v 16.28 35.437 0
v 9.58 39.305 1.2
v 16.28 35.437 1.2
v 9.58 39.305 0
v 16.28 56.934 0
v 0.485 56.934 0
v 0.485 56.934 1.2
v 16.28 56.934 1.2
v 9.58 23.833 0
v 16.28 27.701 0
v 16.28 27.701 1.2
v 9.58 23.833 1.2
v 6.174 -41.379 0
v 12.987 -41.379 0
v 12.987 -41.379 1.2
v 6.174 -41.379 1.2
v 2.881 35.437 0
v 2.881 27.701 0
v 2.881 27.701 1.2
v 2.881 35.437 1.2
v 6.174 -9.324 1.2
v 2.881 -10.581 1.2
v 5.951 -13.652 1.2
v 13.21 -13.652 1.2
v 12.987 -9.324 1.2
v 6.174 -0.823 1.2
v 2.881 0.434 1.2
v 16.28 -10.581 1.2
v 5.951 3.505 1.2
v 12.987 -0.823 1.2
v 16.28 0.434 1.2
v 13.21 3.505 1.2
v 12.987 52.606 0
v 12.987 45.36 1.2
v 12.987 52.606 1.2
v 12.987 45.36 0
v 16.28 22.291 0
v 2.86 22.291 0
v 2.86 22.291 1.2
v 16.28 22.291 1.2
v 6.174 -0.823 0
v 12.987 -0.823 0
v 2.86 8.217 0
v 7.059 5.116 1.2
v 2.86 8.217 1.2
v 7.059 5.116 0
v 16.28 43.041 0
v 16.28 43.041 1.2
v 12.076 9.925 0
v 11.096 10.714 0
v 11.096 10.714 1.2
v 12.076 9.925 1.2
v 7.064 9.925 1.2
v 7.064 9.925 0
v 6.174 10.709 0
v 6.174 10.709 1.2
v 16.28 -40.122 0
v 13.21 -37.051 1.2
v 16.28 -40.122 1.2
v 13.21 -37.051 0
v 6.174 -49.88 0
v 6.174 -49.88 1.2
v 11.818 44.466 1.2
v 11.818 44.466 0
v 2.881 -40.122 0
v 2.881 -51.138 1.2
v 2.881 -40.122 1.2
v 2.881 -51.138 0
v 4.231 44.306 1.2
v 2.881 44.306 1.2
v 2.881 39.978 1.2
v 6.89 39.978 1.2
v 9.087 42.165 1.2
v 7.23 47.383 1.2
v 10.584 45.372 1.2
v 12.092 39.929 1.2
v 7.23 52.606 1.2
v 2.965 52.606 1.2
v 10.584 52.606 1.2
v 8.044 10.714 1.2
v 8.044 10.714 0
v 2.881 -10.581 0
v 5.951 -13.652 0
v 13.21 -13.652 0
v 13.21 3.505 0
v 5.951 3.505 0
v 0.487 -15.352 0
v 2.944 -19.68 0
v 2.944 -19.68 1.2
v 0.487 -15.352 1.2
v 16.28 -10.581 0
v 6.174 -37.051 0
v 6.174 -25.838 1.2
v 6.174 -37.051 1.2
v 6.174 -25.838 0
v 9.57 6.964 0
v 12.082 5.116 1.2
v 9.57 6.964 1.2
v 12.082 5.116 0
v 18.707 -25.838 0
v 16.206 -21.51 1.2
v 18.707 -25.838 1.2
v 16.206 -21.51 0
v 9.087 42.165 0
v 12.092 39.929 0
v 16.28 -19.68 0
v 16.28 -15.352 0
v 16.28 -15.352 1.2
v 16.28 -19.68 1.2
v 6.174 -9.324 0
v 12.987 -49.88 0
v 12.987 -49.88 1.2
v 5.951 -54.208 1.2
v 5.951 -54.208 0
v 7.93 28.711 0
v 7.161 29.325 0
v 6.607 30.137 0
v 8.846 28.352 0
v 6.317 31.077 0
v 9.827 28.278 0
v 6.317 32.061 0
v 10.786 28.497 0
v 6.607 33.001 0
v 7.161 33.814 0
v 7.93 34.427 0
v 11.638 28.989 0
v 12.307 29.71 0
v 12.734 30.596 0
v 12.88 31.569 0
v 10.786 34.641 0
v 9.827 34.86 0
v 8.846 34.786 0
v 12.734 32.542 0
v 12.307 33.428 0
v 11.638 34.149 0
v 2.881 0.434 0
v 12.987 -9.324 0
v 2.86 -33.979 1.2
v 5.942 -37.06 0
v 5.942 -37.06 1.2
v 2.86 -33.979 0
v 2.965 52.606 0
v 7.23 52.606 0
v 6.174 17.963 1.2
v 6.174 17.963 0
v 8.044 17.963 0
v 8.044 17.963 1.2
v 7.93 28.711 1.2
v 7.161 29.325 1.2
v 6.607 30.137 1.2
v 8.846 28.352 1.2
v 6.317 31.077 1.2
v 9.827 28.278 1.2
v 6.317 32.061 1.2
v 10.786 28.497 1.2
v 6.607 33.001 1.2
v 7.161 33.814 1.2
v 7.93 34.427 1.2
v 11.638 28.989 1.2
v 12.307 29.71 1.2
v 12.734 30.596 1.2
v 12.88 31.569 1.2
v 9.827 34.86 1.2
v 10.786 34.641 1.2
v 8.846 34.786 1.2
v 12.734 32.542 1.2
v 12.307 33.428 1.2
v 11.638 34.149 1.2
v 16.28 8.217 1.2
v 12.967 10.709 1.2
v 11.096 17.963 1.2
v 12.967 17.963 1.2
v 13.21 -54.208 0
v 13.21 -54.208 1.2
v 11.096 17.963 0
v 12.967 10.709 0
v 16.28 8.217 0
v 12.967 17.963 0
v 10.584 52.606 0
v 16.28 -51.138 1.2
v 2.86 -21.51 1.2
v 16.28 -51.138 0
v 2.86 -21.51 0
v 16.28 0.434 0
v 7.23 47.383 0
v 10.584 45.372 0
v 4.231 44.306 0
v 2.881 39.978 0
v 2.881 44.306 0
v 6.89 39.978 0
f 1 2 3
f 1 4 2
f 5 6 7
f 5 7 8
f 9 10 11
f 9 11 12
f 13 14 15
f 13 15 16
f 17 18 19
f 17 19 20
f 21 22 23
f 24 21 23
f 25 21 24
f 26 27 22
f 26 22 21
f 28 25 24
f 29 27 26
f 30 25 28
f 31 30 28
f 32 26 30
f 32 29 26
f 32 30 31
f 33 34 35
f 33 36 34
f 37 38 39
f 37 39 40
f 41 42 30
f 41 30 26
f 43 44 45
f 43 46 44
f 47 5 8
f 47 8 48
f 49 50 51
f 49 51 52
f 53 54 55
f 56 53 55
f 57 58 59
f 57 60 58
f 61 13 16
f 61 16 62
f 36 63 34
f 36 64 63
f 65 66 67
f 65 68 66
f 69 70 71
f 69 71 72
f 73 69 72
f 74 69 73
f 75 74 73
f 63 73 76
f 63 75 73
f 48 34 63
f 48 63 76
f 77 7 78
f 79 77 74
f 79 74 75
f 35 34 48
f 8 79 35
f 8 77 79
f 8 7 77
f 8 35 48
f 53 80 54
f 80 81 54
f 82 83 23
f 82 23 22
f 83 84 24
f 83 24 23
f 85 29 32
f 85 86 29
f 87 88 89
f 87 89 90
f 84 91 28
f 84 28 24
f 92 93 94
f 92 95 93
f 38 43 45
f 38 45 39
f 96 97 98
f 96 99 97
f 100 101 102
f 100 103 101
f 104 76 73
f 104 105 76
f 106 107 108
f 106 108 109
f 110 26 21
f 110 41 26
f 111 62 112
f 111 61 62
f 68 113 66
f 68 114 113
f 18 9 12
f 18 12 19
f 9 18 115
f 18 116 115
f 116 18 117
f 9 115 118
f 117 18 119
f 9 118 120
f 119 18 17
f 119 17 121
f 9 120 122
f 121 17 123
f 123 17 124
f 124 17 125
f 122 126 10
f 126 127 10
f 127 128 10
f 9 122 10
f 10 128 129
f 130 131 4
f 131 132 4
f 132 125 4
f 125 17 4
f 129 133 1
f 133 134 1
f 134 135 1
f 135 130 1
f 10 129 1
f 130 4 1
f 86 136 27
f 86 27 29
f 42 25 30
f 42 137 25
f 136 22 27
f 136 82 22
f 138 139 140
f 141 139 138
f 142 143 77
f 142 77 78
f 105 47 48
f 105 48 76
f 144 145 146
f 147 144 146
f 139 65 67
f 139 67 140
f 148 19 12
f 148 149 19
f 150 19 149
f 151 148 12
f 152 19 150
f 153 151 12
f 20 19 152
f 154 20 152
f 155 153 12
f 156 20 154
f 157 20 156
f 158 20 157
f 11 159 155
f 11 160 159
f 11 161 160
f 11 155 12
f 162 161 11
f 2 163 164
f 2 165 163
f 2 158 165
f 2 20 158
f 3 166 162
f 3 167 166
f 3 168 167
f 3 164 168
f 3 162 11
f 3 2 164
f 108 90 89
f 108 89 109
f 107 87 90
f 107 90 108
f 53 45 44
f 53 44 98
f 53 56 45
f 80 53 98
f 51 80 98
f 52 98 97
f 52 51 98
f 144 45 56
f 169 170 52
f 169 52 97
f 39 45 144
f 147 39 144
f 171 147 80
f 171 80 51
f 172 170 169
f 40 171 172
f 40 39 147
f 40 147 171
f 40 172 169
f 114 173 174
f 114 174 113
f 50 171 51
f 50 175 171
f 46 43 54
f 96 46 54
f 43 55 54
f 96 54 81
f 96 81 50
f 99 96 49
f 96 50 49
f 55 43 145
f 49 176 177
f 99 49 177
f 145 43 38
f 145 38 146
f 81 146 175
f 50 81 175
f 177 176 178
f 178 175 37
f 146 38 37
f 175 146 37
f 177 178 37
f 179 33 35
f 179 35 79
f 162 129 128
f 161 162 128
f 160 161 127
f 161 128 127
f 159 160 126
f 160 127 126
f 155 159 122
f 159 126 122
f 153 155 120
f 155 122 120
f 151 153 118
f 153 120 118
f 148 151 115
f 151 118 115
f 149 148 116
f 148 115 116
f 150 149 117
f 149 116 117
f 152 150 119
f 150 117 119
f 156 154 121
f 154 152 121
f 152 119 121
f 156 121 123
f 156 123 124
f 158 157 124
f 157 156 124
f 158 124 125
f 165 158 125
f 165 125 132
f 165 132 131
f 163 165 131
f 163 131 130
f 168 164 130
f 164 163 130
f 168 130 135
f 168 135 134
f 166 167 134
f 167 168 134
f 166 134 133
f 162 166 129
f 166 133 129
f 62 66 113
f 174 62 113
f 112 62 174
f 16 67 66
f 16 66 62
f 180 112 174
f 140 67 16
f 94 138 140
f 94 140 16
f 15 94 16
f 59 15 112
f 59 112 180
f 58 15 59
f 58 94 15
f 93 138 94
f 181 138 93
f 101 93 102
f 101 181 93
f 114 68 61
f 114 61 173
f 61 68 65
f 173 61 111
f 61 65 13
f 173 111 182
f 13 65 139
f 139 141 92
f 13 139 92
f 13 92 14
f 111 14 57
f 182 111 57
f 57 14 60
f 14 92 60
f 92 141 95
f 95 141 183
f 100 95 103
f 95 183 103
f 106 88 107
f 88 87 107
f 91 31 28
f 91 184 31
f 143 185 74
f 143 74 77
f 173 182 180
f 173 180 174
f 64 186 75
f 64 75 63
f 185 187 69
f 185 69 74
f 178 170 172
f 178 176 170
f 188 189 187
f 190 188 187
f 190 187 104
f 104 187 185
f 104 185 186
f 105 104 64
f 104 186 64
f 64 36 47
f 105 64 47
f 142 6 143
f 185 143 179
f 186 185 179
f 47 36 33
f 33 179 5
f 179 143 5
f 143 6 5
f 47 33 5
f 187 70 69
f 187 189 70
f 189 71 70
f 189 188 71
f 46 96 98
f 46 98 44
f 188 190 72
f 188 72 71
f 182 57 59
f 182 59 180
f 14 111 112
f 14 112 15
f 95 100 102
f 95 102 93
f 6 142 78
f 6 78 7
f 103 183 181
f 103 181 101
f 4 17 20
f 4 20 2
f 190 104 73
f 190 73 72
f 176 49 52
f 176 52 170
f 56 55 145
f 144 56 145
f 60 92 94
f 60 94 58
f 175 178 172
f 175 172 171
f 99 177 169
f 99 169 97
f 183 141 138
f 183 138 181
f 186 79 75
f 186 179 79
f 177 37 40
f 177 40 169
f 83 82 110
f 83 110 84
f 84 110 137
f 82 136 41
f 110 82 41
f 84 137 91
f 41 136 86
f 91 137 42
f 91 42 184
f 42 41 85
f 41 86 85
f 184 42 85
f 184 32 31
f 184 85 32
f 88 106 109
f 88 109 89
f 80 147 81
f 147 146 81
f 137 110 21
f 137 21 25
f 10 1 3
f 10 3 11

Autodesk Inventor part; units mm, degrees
ref_plane "YZ Plane" through (0, 0, 0) normal (1, 0, 0) x (0, 1, 0)
ref_plane "XZ Plane" through (0, 0, 0) normal (0, 1, 0) x (-1, 0, 0)
ref_plane "XY Plane" through (0, 0, 0) normal (0, 0, 1) x (1, 0, 0)
sketch "Sketch1" plane through (0, 0, 0) normal (0, 0, 1) x (1, 0, 0)
  line L0 (13.187, 45.2611) -> (13.187, 52.8058) construction
  line L1 (11.8207, 44.2163) -> (13.187, 45.2611) construction
  line L2 (10.3841, 45.2712) -> (11.8207, 44.2163) construction
  line L3 (10.3841, 52.8058) -> (10.3841, 45.2712) construction
  line L4 (13.187, 52.8058) -> (10.3841, 52.8058) construction
  line L5 (3.0806, 40.1778) -> (3.0806, 44.1058) construction
  line L6 (6.8077, 40.1778) -> (3.0806, 40.1778) construction
  line L7 (9.0681, 42.4281) -> (6.8077, 40.1778) construction
  line L8 (12.0919, 40.1778) -> (9.0681, 42.4281) construction
  line L9 (16.0802, 43.1414) -> (12.0919, 40.1778) construction
  line L10 (16.0802, 56.7338) -> (16.0802, 43.1414) construction
  line L11 (0.8302, 56.7338) -> (16.0802, 56.7338) construction
  line L12 (3.0806, 52.8058) -> (0.8302, 56.7338) construction
  line L13 (7.4305, 52.8058) -> (3.0806, 52.8058) construction
  line L14 (7.4305, 47.3013) -> (7.4305, 52.8058) construction
  line L15 (4.3156, 44.1058) -> (7.4305, 47.3013) construction
  line L16 (3.0806, 44.1058) -> (4.3156, 44.1058) construction
  line L17 (3.0806, 27.8164) -> (3.0806, 35.3218) construction
  line L18 (9.5804, 24.0637) -> (3.0806, 27.8164) construction
  line L19 (16.0802, 27.8164) -> (9.5804, 24.0637) construction
  line L20 (16.0802, 35.3218) -> (16.0802, 27.8164) construction
  line L21 (9.5804, 39.0745) -> (16.0802, 35.3218) construction
  line L22 (3.0806, 35.3218) -> (9.5804, 39.0745) construction
  circle A0 centre (9.5804, 31.5691) radius 3.5 construction
  line L23 (13.1669, 10.6183) -> (13.1669, 18.163) construction
  line L24 (12.0819, 9.664) -> (13.1669, 10.6183) construction
  line L25 (10.8965, 10.6183) -> (12.0819, 9.664) construction
  line L26 (10.8965, 18.163) -> (10.8965, 10.6183) construction
  line L27 (13.1669, 18.163) -> (10.8965, 18.163) construction
  line L28 (8.2443, 10.6183) -> (8.2443, 18.163) construction
  line L29 (7.0588, 9.664) -> (8.2443, 10.6183) construction
  line L30 (5.9739, 10.6183) -> (7.0588, 9.664) construction
  line L31 (5.9739, 18.163) -> (5.9739, 10.6183) construction
  line L32 (8.2443, 18.163) -> (5.9739, 18.163) construction
  line L33 (7.0588, 5.3642) -> (3.0605, 8.3178) construction
  line L34 (9.5704, 7.2127) -> (7.0588, 5.3642) construction
  line L35 (12.0819, 5.3642) -> (9.5704, 7.2127) construction
  line L36 (16.0802, 8.3178) -> (12.0819, 5.3642) construction
  line L37 (16.0802, 22.091) -> (16.0802, 8.3178) construction
  line L38 (3.0605, 22.091) -> (16.0802, 22.091) construction
  line L39 (3.0605, 8.3178) -> (3.0605, 22.091) construction
  line L40 (13.187, -9.5241) -> (13.187, -0.6233) construction
  line L41 (5.9739, -9.5241) -> (13.187, -9.5241) construction
  line L42 (5.9739, -0.6233) -> (5.9739, -9.5241) construction
  line L43 (13.187, -0.6233) -> (5.9739, -0.6233) construction
  line L44 (6.0341, -13.4521) -> (3.0806, -10.4986) construction
  line L45 (13.1267, -13.4521) -> (6.0341, -13.4521) construction
  line L46 (16.0802, -10.4986) -> (13.1267, -13.4521) construction
  line L47 (16.0802, 0.3512) -> (16.0802, -10.4986) construction
  line L48 (13.1267, 3.3048) -> (16.0802, 0.3512) construction
  line L49 (6.0341, 3.3048) -> (13.1267, 3.3048) construction
  line L50 (3.0806, 0.3512) -> (6.0341, 3.3048) construction
  line L51 (3.0806, -10.4986) -> (3.0806, 0.3512) construction
  line L52 (3.0605, -19.4798) -> (0.8302, -15.5518) construction
  line L53 (16.0802, -19.4798) -> (3.0605, -19.4798) construction
  line L54 (16.0802, -15.5518) -> (16.0802, -19.4798) construction
  line L55 (0.8302, -15.5518) -> (16.0802, -15.5518) construction
  line L56 (5.9739, -36.8094) -> (3.0605, -33.896) construction
  line L57 (5.9739, -25.6381) -> (5.9739, -36.8094) construction
  line L58 (18.3607, -25.6381) -> (5.9739, -25.6381) construction
  line L59 (16.0903, -21.7101) -> (18.3607, -25.6381) construction
  line L60 (3.0605, -21.7101) -> (16.0903, -21.7101) construction
  line L61 (3.0605, -33.896) -> (3.0605, -21.7101) construction
  line L62 (13.187, -50.0803) -> (13.187, -41.1794) construction
  line L63 (5.9739, -50.0803) -> (13.187, -50.0803) construction
  line L64 (5.9739, -41.1794) -> (5.9739, -50.0803) construction
  line L65 (13.187, -41.1794) -> (5.9739, -41.1794) construction
  line L66 (6.0341, -54.0083) -> (3.0806, -51.0548) construction
  line L67 (13.1267, -54.0083) -> (6.0341, -54.0083) construction
  line L68 (16.0802, -51.0548) -> (13.1267, -54.0083) construction
  line L69 (16.0802, -40.2049) -> (16.0802, -51.0548) construction
  line L70 (13.1267, -37.2514) -> (16.0802, -40.2049) construction
  line L71 (6.0341, -37.2514) -> (13.1267, -37.2514) construction
  line L72 (3.0806, -40.2049) -> (6.0341, -37.2514) construction
  line L73 (3.0806, -51.0548) -> (3.0806, -40.2049) construction
  line L74 (7.2305, 52.6058) -> (2.9647, 52.6058)
  line L75 (2.9647, 52.6058) -> (0.4852, 56.9338)
  line L76 (0.4852, 56.9338) -> (16.2802, 56.9338)
  line L77 (16.2802, 56.9338) -> (16.2802, 43.0408)
  line L78 (16.2802, 43.0408) -> (12.0919, 39.9286)
  line L79 (12.0919, 39.9286) -> (9.087, 42.1647)
  line L80 (9.087, 42.1647) -> (6.8903, 39.9778)
  line L81 (6.8903, 39.9778) -> (2.8806, 39.9778)
  line L82 (2.8806, 39.9778) -> (2.8806, 44.3058)
  line L83 (2.8806, 44.3058) -> (4.2313, 44.3058)
  line L84 (4.2313, 44.3058) -> (7.2305, 47.3827)
  line L85 (7.2305, 47.3827) -> (7.2305, 52.6058)
  line L86 (11.8183, 44.4662) -> (12.987, 45.36)
  line L87 (12.987, 45.36) -> (12.987, 52.6058)
  line L88 (12.987, 52.6058) -> (10.5841, 52.6058)
  line L89 (10.5841, 52.6058) -> (10.5841, 45.3724)
  line L90 (10.5841, 45.3724) -> (11.8183, 44.4662)
  circle A1 centre (9.5804, 31.5691) radius 3.3
  line L91 (9.5804, 39.3054) -> (16.2802, 35.4373)
  line L92 (16.2802, 35.4373) -> (16.2802, 27.7009)
  line L93 (16.2802, 27.7009) -> (9.5804, 23.8328)
  line L94 (9.5804, 23.8328) -> (2.8806, 27.7009)
  line L95 (2.8806, 27.7009) -> (2.8806, 35.4373)
  line L96 (2.8806, 35.4373) -> (9.5804, 39.3054)
  line L97 (16.2802, 22.291) -> (16.2802, 8.2169)
  line L98 (16.2802, 8.2169) -> (12.0821, 5.1157)
  line L99 (12.0821, 5.1157) -> (9.5704, 6.9644)
  line L100 (9.5704, 6.9644) -> (7.0586, 5.1157)
  line L101 (7.0586, 5.1157) -> (2.8605, 8.2169)
  line L102 (2.8605, 8.2169) -> (2.8605, 22.291)
  line L103 (2.8605, 22.291) -> (16.2802, 22.291)
  line L104 (8.0443, 17.963) -> (8.0443, 10.7141)
  line L105 (8.0443, 10.7141) -> (7.0645, 9.9253)
  line L106 (7.0645, 9.9253) -> (6.1739, 10.7088)
  line L107 (6.1739, 10.7088) -> (6.1739, 17.963)
  line L108 (6.1739, 17.963) -> (8.0443, 17.963)
  line L109 (11.0965, 10.7141) -> (12.0762, 9.9253)
  line L110 (12.0762, 9.9253) -> (12.9669, 10.7088)
  line L111 (12.9669, 10.7088) -> (12.9669, 17.963)
  line L112 (12.9669, 17.963) -> (11.0965, 17.963)
  line L113 (11.0965, 17.963) -> (11.0965, 10.7141)
  line L114 (13.2095, 3.5048) -> (16.2802, 0.4341)
  line L115 (16.2802, 0.4341) -> (16.2802, -10.5814)
  line L116 (16.2802, -10.5814) -> (13.2095, -13.6521)
  line L117 (13.2095, -13.6521) -> (5.9513, -13.6521)
  line L118 (5.9513, -13.6521) -> (2.8806, -10.5814)
  line L119 (2.8806, -10.5814) -> (2.8806, 0.4341)
  line L120 (2.8806, 0.4341) -> (5.9513, 3.5048)
  line L121 (5.9513, 3.5048) -> (13.2095, 3.5048)
  line L122 (6.1739, -0.8233) -> (6.1739, -9.3241)
  line L123 (6.1739, -9.3241) -> (12.987, -9.3241)
  line L124 (12.987, -9.3241) -> (12.987, -0.8233)
  line L125 (12.987, -0.8233) -> (6.1739, -0.8233)
  line L126 (16.2802, -15.3518) -> (16.2802, -19.6798)
  line L127 (16.2802, -19.6798) -> (2.9441, -19.6798)
  line L128 (2.9441, -19.6798) -> (0.4867, -15.3518)
  line L129 (0.4867, -15.3518) -> (16.2802, -15.3518)
  line L130 (6.1739, -37.2922) -> (2.8605, -33.9788)
  line L131 (2.8605, -33.9788) -> (2.8605, -21.5101)
  line L132 (2.8605, -21.5101) -> (16.2057, -21.5101)
  line L133 (16.2057, -21.5101) -> (18.7073, -25.8381)
  line L134 (18.7073, -25.8381) -> (6.1739, -25.8381)
  line L135 (6.1739, -25.8381) -> (6.1739, -37.2922)
  line L136 (13.2095, -37.0514) -> (16.2802, -40.1221)
  line L137 (16.2802, -40.1221) -> (16.2802, -51.1376)
  line L138 (16.2802, -51.1376) -> (13.2095, -54.2083)
  line L139 (13.2095, -54.2083) -> (5.9513, -54.2083)
  line L140 (5.9513, -54.2083) -> (2.8806, -51.1376)
  line L141 (2.8806, -51.1376) -> (2.8806, -40.1221)
  line L142 (2.8806, -40.1221) -> (5.9513, -37.0514)
  line L143 (5.9513, -37.0514) -> (13.2095, -37.0514)
  line L144 (6.1739, -41.3794) -> (6.1739, -49.8803)
  line L145 (6.1739, -49.8803) -> (12.987, -49.8803)
  line L146 (12.987, -49.8803) -> (12.987, -41.3794)
  line L147 (12.987, -41.3794) -> (6.1739, -41.3794)
  point P0 (0, 0)
  point P1 (6.1739, -37.0514)
  point P2 (5.9422, -37.0605)
extrude "Extrusion1" add sketch "Sketch1" along normal blind 1.2
properties part number "roboilo"
